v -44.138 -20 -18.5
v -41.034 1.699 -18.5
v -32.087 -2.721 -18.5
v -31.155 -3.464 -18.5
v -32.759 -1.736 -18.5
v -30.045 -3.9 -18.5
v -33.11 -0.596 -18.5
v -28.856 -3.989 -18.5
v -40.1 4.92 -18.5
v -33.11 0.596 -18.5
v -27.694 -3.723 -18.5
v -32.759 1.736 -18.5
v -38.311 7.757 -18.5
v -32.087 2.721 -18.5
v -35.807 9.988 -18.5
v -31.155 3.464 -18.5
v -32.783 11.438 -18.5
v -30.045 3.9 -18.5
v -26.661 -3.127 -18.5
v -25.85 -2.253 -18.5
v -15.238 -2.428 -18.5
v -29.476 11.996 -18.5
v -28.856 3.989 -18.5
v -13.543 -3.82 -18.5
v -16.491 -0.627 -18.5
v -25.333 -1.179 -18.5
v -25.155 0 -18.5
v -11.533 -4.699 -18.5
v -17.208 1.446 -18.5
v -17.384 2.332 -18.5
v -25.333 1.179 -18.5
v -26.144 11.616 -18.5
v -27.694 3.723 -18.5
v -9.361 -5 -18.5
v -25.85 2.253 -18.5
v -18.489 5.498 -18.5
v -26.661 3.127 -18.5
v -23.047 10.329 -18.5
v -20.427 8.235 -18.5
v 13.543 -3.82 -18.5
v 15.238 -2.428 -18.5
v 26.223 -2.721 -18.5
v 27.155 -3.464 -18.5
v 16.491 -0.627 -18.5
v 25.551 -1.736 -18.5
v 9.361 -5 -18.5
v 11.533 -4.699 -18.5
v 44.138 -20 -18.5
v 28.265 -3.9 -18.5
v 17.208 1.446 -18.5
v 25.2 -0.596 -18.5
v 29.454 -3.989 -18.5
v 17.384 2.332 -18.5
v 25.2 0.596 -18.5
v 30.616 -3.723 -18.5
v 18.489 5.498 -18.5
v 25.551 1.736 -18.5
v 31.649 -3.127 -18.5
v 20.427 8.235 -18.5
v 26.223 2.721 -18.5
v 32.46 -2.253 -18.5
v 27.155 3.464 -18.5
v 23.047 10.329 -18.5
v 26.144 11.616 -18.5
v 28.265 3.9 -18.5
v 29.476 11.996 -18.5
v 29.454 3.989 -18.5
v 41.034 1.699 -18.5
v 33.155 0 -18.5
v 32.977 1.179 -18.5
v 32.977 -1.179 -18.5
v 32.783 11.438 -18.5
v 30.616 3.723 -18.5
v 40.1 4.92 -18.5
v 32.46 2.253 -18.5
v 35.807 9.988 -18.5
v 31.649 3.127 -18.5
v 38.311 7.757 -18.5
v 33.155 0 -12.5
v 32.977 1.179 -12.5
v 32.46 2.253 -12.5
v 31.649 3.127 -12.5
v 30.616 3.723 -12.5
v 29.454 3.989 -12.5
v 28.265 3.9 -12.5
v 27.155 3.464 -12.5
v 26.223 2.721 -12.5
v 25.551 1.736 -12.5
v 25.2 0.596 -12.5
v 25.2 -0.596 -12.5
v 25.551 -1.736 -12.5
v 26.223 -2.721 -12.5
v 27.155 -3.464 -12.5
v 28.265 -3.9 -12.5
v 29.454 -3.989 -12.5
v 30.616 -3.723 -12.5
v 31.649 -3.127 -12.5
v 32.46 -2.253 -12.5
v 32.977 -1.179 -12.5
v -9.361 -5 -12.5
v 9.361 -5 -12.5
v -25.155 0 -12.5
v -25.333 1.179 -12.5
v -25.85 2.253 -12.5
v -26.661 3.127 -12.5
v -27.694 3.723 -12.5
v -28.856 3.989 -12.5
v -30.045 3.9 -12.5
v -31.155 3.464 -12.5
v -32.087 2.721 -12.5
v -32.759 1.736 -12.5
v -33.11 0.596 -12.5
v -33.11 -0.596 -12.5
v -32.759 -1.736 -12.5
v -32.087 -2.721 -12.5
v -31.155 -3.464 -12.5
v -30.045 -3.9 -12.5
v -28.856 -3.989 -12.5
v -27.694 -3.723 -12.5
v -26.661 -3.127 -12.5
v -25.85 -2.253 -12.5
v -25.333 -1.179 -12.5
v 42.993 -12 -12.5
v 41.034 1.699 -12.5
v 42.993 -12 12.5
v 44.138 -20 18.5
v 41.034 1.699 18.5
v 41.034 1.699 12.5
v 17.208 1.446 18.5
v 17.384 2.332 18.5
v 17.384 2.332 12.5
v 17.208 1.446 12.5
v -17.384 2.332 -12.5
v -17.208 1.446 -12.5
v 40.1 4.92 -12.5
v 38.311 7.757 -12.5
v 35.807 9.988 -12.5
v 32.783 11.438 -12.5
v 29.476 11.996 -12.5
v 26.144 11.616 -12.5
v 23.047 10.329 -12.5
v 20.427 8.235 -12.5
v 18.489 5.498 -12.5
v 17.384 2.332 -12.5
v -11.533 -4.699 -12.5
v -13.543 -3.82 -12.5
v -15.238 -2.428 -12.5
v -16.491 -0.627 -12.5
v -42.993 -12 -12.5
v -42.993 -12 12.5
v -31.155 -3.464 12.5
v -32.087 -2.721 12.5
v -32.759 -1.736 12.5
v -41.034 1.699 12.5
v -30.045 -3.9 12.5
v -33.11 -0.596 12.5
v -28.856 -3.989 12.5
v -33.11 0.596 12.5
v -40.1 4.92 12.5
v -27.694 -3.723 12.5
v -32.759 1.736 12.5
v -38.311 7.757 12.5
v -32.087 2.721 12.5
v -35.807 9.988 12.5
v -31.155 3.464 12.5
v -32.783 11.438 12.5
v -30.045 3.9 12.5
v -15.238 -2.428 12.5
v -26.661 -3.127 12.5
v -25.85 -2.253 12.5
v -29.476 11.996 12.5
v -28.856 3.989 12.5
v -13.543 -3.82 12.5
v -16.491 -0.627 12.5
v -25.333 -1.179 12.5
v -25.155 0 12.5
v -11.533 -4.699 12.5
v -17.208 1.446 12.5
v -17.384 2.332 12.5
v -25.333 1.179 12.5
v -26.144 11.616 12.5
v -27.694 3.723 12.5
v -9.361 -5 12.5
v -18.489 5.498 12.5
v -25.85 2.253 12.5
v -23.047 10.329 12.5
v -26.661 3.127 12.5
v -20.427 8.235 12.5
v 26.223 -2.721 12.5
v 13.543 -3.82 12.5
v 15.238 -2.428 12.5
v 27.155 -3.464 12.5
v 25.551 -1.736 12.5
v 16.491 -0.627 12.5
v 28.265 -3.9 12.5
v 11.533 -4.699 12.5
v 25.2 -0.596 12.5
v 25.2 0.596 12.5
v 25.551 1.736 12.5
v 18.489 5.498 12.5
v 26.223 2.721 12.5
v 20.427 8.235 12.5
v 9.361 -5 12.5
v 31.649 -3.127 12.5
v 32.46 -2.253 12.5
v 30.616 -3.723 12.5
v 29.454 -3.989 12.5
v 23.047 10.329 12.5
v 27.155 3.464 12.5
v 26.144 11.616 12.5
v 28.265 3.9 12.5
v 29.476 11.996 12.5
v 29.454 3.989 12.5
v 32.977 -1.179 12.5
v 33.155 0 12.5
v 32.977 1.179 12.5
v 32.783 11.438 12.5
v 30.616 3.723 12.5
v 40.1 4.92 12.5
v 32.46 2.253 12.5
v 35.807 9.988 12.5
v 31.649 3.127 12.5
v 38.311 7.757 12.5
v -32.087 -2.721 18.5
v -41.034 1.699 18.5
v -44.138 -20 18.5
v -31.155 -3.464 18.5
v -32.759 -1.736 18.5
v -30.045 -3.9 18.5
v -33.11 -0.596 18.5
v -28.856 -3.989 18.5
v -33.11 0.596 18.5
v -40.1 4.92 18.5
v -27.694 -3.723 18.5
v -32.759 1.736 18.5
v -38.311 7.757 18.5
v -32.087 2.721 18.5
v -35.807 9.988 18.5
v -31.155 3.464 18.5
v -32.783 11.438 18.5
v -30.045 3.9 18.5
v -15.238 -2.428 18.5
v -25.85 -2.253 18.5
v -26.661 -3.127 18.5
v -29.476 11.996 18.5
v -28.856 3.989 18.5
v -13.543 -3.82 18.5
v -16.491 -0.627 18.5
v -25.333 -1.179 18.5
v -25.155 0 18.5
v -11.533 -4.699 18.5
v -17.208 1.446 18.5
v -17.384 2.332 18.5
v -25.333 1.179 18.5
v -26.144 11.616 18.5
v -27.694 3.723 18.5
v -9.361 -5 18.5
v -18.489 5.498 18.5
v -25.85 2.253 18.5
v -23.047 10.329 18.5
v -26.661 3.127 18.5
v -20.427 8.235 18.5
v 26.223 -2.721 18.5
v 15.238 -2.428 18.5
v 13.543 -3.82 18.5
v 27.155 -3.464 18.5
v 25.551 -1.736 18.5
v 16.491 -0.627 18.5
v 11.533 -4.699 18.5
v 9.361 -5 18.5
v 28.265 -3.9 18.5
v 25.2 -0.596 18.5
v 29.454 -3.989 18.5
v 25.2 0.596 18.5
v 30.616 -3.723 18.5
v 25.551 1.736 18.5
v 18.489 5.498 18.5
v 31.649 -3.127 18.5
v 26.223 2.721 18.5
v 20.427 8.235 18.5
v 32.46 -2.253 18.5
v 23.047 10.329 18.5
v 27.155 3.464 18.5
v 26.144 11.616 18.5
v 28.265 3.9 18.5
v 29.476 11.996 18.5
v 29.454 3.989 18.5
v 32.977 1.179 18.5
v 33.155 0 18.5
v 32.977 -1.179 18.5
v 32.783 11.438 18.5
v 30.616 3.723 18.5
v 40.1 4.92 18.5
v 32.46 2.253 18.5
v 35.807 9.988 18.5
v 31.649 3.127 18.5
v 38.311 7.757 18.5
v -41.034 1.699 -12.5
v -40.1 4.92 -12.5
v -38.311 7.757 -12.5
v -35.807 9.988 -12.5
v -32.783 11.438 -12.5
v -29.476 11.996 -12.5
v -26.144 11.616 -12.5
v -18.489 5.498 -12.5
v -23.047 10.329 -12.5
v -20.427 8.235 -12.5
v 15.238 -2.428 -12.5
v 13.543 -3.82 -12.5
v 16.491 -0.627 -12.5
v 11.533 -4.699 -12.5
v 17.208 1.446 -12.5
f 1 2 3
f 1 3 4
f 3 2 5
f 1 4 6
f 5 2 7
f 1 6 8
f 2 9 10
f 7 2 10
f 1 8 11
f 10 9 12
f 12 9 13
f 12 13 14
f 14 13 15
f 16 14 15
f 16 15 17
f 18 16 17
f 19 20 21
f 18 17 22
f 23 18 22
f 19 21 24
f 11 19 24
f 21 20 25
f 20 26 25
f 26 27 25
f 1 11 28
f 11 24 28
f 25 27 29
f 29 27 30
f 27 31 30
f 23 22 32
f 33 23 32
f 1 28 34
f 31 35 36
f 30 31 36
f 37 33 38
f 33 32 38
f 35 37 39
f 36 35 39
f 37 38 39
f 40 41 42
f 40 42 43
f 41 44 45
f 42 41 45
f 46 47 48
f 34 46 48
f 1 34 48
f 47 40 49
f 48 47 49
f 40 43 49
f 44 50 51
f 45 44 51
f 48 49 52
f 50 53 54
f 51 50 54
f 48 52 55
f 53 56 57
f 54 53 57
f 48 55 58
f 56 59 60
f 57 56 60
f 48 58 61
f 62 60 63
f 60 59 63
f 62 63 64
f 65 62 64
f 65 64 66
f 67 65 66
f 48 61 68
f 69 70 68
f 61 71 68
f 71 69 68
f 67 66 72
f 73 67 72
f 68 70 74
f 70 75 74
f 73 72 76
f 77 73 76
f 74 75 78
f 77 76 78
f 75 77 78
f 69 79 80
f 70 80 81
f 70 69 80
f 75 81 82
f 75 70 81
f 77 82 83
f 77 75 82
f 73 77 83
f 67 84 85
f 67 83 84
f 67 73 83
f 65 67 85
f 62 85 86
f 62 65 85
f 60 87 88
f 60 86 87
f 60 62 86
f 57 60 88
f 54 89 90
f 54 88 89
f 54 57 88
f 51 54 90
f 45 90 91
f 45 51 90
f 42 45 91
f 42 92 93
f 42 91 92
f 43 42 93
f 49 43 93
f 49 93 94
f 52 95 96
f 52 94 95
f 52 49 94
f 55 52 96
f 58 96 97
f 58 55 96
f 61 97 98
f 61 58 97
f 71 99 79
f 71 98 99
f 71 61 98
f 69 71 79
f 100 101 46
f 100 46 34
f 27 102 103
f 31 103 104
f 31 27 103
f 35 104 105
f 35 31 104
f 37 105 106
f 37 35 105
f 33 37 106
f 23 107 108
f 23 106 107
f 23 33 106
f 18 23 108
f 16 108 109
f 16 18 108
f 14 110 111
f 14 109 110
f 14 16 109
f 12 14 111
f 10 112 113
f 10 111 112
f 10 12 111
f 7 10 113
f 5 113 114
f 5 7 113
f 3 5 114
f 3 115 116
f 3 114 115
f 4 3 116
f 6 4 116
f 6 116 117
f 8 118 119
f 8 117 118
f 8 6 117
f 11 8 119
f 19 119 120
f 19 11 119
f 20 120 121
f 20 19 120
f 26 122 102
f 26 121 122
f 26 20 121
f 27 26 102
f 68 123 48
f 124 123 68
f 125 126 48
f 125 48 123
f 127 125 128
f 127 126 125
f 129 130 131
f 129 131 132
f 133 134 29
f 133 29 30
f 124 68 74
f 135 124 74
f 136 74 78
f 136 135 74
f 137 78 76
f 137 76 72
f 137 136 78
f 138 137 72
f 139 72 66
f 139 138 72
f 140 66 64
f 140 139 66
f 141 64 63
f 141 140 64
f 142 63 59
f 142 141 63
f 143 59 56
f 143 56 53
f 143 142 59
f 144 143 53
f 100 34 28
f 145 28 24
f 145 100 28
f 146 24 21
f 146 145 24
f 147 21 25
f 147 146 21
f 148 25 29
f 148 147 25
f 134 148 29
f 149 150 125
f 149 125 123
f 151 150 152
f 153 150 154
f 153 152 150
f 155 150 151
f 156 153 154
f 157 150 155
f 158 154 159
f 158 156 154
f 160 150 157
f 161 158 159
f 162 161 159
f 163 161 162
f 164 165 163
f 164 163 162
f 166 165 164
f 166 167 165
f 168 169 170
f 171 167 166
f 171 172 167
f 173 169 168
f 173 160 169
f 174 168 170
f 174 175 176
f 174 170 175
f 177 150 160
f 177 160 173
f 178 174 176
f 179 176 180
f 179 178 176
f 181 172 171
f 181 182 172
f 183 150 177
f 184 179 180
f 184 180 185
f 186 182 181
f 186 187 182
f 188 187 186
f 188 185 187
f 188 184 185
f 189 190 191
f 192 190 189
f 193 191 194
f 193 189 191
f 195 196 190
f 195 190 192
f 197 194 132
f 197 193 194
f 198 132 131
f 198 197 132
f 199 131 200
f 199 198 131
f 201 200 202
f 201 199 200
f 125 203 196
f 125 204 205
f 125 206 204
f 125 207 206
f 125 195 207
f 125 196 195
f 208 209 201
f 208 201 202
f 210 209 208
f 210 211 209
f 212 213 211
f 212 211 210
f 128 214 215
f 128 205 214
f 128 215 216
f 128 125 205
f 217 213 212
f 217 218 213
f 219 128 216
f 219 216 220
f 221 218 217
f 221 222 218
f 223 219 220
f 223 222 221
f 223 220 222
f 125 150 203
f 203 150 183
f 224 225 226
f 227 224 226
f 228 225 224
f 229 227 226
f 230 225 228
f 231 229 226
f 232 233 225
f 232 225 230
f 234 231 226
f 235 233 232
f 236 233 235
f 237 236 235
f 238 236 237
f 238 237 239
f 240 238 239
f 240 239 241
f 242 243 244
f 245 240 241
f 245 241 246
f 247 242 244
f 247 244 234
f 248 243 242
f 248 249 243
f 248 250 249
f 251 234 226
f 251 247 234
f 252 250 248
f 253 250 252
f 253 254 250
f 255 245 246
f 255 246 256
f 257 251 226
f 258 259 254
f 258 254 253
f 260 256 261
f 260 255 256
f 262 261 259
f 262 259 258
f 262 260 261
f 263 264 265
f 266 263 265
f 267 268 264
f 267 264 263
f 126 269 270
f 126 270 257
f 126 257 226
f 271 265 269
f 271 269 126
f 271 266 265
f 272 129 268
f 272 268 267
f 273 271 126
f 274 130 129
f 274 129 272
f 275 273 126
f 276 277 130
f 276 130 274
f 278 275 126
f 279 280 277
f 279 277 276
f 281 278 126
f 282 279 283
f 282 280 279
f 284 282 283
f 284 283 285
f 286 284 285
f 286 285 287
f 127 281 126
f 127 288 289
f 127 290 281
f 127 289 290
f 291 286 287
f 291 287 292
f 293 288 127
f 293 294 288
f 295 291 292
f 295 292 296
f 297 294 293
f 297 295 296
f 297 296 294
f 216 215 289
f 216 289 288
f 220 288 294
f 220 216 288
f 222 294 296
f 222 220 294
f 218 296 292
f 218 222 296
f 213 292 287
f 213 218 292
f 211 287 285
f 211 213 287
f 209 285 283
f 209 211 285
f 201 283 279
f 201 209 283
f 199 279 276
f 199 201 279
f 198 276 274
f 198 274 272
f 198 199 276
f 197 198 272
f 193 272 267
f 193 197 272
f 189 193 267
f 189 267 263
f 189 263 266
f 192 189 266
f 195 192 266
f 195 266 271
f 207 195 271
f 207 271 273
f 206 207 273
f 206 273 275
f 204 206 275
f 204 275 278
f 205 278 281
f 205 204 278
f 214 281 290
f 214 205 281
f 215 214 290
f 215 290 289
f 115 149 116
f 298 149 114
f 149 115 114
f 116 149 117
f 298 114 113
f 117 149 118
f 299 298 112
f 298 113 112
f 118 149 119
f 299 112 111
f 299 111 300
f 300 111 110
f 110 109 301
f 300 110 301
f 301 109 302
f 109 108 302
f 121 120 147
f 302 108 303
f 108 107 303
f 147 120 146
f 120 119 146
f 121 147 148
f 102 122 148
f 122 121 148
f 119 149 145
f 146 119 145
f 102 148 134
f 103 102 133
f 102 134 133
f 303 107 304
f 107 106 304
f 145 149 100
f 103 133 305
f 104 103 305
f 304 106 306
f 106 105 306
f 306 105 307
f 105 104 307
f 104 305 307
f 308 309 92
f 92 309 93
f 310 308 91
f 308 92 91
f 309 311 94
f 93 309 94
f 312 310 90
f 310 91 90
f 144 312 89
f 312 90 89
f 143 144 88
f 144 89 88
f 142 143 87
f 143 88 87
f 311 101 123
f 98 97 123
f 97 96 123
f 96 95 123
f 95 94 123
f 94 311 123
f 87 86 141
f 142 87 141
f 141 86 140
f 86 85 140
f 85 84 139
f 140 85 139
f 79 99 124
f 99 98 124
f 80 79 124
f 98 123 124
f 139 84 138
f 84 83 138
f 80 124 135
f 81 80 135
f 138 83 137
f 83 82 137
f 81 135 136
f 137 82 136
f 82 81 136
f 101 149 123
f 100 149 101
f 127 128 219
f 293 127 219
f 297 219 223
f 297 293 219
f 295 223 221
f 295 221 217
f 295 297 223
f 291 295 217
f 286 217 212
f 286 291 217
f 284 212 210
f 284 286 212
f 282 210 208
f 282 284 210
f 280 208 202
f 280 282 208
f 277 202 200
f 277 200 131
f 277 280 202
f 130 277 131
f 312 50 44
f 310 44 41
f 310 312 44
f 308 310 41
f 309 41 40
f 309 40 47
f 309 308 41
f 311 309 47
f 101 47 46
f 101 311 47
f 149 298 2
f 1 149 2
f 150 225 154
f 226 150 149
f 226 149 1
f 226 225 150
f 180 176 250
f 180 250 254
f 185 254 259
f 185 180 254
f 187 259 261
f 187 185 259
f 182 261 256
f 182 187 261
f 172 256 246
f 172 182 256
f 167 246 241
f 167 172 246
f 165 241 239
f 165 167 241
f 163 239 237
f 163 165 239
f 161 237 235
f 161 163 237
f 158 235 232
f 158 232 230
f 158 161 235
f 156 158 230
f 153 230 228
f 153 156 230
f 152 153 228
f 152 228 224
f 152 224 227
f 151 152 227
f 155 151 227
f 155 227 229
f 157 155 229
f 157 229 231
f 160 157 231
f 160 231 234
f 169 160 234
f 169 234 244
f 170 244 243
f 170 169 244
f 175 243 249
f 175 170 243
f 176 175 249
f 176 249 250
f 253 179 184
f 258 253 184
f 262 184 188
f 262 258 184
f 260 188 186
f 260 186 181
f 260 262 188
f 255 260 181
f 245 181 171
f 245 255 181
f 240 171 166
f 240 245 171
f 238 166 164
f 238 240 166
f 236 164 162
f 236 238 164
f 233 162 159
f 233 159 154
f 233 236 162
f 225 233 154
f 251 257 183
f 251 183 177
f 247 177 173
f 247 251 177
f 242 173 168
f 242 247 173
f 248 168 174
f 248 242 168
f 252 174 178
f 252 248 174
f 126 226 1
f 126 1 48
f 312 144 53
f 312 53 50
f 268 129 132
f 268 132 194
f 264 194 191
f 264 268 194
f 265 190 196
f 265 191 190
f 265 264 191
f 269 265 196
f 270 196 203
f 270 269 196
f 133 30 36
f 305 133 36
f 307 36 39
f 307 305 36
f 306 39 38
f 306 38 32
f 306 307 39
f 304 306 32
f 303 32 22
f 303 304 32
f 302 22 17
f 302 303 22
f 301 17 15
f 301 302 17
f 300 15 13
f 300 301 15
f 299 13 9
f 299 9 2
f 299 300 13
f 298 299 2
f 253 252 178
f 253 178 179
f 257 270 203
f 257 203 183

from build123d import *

# Parameters (mm, degrees)
SKETCH1_R           = 4
BOSS_EXTRUDE1_DEPTH = 18.5
SKETCH2_W           = 25
SKETCH2_H           = 26.496950103
CUT_EXTRUDE1_DEPTH  = 50


with BuildPart() as part:
    # Sketch1 → Boss-Extrude1 (new body, symmetric)
    with BuildSketch(Plane.XY):
        with BuildLine():
            Line((-41.034119288, 1.698977617), (-44.137554517, -20))
            Line((-44.137554517, -20), (44.137554517, -20))
            Line((44.137554517, -20), (41.034119288, 1.698977617))
            ThreePointArc((41.034119288, 1.698977617), (29.475850132, 11.995709866), (17.38368573, 2.331557498))
            Line((17.38368573, 2.331557498), (17.208208741, 1.445628335))
            ThreePointArc((17.208208741, 1.445628335), (14.438314301, -3.182029332), (9.360665895, -5))
            Line((9.360665895, -5), (-9.360665895, -5))
            ThreePointArc((-9.360665895, -5), (-14.438314301, -3.182029332), (-17.208208741, 1.445628335))
            Line((-17.208208741, 1.445628335), (-17.38368573, 2.331557498))
            ThreePointArc((-17.38368573, 2.331557498), (-29.475850132, 11.995709866), (-41.034119288, 1.698977617))
        make_face()
        with Locations((29.155, 0)):
            Circle(SKETCH1_R, mode=Mode.SUBTRACT)
        with Locations((-29.155, 0)):
            Circle(SKETCH1_R, mode=Mode.SUBTRACT)
    extrude(amount=BOSS_EXTRUDE1_DEPTH, both=True)

    # Sketch2 → Cut-Extrude1 (cut, symmetric)
    with BuildSketch(Plane(origin=(0, 0, 0), x_dir=(0, 0, -1), z_dir=(1, 0, 0))):
        with Locations((0, 1.248475052)):
            Rectangle(SKETCH2_W, SKETCH2_H)
    extrude(amount=CUT_EXTRUDE1_DEPTH, both=True, mode=Mode.SUBTRACT)


solid = part.part
